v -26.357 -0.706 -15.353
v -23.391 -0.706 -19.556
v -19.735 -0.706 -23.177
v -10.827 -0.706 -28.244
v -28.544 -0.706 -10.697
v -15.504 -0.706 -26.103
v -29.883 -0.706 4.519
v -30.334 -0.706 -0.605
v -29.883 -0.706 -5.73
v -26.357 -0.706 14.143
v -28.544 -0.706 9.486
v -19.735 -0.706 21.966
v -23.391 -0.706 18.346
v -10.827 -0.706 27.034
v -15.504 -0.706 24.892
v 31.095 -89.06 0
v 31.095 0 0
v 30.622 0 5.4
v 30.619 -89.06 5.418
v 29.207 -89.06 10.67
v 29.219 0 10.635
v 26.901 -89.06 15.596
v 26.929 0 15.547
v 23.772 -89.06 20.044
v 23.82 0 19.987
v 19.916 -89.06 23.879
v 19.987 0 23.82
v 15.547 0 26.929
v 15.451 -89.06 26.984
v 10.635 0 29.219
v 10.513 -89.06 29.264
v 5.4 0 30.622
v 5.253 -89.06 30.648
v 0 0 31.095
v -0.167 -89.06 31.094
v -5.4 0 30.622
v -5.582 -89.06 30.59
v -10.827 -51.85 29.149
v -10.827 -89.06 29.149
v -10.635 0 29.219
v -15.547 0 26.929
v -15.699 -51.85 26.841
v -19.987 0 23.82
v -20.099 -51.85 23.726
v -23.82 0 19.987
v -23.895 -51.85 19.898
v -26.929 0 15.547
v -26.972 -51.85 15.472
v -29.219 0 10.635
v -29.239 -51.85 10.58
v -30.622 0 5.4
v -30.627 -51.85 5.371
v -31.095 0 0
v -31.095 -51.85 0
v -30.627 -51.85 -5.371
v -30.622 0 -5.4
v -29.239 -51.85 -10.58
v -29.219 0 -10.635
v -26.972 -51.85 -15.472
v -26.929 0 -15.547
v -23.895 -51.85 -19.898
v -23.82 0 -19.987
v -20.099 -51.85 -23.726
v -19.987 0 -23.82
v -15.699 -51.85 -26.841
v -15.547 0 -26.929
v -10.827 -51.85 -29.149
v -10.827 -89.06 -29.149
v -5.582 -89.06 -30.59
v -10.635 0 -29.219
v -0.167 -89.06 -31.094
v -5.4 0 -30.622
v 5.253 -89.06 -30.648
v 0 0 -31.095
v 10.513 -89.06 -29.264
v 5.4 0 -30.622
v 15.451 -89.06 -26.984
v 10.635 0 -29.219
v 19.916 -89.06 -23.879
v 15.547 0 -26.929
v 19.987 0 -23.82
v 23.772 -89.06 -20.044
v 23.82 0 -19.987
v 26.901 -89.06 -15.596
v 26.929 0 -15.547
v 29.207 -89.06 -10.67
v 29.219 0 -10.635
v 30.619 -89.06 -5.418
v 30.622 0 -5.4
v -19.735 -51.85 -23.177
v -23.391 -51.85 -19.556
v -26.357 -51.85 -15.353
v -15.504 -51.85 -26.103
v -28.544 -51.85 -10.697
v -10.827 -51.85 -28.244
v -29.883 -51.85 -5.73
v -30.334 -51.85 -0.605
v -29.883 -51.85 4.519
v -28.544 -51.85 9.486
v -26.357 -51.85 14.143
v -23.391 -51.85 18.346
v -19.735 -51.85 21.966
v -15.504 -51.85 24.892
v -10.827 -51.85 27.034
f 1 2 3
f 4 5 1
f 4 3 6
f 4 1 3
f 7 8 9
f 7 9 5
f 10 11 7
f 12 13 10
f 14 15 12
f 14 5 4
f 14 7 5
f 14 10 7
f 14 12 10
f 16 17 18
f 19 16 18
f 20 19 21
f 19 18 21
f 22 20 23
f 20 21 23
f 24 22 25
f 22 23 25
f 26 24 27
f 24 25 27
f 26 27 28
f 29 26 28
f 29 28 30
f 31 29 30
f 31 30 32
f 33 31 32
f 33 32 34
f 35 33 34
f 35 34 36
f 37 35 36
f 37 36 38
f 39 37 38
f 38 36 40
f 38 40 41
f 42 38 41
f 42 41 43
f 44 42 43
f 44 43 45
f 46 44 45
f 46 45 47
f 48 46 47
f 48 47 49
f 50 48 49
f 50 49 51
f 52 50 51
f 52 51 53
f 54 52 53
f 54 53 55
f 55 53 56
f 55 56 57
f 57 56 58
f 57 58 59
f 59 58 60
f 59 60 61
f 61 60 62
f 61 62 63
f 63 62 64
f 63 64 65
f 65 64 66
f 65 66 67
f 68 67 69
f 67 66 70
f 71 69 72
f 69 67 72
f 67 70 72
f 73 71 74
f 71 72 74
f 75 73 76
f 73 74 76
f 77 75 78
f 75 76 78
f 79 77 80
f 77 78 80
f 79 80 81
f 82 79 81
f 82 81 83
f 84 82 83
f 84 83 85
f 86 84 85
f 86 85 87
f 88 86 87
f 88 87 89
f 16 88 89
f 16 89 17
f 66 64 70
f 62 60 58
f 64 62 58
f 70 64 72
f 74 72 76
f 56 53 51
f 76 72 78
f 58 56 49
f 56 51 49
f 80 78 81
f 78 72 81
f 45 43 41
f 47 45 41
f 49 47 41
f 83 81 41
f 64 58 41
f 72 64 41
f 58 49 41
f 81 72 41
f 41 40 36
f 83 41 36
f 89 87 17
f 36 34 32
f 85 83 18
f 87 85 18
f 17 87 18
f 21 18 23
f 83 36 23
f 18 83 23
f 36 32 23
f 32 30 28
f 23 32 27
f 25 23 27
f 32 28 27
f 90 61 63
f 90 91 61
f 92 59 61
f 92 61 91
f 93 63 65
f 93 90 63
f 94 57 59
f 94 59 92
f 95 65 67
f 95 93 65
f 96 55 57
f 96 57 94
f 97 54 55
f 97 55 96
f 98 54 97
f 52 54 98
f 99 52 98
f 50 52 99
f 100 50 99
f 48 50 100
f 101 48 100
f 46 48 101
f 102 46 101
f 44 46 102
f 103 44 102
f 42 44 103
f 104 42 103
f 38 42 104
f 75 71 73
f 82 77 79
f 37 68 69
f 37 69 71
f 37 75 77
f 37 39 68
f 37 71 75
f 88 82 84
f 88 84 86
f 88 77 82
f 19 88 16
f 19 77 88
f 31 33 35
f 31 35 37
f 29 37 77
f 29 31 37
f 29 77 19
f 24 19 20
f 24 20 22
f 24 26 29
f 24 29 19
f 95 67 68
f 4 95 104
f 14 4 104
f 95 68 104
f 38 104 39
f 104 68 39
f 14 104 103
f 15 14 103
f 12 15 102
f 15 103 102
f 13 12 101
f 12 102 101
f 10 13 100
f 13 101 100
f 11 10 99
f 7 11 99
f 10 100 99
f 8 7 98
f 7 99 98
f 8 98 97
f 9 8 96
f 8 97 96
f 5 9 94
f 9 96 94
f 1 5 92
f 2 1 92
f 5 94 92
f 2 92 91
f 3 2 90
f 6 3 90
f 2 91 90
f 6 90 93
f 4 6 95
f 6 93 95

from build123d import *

# Parameters (mm, degrees)
F0_R     = 31.0947263036
F1_DEPTH = 89.0598669648
F3_DEPTH = 37.2095629573
F5_DEPTH = 51.1443465948


with BuildPart() as f1:
    # F0 (on Front) → F1 (new body)
    with BuildSketch(Plane.XZ):
        Circle(F0_R)
    extrude(amount=F1_DEPTH)

    # F2 (on face) → F3 (cut)
    with BuildSketch(Plane.XZ.offset(89.0598669648)):
        with BuildLine():
            Line((-10.8266547322, -29.1490231604), (-10.8266547322, 0))
            Line((-10.8266547322, 0), (-10.8266547322, 29.1490231604))
            ThreePointArc((-10.8266547322, 29.1490231604), (-31.0947263036, 0), (-10.8266547322, -29.1490231604))
        make_face()
    extrude(amount=-F3_DEPTH, mode=Mode.SUBTRACT)

    # F4 (on face) → F5 (cut)
    with BuildSketch(Plane.XZ.offset(51.8503040075)):
        with BuildLine():
            Line((-10.8266547322, -28.2442569733), (-10.8266547322, 27.0338580012))
            ThreePointArc((-10.8266547322, 27.0338580012), (-30.3341260618, -0.605199486), (-10.8266547322, -28.2442569733))
        make_face()
    extrude(amount=-F5_DEPTH, mode=Mode.SUBTRACT)


solid = f1.part
